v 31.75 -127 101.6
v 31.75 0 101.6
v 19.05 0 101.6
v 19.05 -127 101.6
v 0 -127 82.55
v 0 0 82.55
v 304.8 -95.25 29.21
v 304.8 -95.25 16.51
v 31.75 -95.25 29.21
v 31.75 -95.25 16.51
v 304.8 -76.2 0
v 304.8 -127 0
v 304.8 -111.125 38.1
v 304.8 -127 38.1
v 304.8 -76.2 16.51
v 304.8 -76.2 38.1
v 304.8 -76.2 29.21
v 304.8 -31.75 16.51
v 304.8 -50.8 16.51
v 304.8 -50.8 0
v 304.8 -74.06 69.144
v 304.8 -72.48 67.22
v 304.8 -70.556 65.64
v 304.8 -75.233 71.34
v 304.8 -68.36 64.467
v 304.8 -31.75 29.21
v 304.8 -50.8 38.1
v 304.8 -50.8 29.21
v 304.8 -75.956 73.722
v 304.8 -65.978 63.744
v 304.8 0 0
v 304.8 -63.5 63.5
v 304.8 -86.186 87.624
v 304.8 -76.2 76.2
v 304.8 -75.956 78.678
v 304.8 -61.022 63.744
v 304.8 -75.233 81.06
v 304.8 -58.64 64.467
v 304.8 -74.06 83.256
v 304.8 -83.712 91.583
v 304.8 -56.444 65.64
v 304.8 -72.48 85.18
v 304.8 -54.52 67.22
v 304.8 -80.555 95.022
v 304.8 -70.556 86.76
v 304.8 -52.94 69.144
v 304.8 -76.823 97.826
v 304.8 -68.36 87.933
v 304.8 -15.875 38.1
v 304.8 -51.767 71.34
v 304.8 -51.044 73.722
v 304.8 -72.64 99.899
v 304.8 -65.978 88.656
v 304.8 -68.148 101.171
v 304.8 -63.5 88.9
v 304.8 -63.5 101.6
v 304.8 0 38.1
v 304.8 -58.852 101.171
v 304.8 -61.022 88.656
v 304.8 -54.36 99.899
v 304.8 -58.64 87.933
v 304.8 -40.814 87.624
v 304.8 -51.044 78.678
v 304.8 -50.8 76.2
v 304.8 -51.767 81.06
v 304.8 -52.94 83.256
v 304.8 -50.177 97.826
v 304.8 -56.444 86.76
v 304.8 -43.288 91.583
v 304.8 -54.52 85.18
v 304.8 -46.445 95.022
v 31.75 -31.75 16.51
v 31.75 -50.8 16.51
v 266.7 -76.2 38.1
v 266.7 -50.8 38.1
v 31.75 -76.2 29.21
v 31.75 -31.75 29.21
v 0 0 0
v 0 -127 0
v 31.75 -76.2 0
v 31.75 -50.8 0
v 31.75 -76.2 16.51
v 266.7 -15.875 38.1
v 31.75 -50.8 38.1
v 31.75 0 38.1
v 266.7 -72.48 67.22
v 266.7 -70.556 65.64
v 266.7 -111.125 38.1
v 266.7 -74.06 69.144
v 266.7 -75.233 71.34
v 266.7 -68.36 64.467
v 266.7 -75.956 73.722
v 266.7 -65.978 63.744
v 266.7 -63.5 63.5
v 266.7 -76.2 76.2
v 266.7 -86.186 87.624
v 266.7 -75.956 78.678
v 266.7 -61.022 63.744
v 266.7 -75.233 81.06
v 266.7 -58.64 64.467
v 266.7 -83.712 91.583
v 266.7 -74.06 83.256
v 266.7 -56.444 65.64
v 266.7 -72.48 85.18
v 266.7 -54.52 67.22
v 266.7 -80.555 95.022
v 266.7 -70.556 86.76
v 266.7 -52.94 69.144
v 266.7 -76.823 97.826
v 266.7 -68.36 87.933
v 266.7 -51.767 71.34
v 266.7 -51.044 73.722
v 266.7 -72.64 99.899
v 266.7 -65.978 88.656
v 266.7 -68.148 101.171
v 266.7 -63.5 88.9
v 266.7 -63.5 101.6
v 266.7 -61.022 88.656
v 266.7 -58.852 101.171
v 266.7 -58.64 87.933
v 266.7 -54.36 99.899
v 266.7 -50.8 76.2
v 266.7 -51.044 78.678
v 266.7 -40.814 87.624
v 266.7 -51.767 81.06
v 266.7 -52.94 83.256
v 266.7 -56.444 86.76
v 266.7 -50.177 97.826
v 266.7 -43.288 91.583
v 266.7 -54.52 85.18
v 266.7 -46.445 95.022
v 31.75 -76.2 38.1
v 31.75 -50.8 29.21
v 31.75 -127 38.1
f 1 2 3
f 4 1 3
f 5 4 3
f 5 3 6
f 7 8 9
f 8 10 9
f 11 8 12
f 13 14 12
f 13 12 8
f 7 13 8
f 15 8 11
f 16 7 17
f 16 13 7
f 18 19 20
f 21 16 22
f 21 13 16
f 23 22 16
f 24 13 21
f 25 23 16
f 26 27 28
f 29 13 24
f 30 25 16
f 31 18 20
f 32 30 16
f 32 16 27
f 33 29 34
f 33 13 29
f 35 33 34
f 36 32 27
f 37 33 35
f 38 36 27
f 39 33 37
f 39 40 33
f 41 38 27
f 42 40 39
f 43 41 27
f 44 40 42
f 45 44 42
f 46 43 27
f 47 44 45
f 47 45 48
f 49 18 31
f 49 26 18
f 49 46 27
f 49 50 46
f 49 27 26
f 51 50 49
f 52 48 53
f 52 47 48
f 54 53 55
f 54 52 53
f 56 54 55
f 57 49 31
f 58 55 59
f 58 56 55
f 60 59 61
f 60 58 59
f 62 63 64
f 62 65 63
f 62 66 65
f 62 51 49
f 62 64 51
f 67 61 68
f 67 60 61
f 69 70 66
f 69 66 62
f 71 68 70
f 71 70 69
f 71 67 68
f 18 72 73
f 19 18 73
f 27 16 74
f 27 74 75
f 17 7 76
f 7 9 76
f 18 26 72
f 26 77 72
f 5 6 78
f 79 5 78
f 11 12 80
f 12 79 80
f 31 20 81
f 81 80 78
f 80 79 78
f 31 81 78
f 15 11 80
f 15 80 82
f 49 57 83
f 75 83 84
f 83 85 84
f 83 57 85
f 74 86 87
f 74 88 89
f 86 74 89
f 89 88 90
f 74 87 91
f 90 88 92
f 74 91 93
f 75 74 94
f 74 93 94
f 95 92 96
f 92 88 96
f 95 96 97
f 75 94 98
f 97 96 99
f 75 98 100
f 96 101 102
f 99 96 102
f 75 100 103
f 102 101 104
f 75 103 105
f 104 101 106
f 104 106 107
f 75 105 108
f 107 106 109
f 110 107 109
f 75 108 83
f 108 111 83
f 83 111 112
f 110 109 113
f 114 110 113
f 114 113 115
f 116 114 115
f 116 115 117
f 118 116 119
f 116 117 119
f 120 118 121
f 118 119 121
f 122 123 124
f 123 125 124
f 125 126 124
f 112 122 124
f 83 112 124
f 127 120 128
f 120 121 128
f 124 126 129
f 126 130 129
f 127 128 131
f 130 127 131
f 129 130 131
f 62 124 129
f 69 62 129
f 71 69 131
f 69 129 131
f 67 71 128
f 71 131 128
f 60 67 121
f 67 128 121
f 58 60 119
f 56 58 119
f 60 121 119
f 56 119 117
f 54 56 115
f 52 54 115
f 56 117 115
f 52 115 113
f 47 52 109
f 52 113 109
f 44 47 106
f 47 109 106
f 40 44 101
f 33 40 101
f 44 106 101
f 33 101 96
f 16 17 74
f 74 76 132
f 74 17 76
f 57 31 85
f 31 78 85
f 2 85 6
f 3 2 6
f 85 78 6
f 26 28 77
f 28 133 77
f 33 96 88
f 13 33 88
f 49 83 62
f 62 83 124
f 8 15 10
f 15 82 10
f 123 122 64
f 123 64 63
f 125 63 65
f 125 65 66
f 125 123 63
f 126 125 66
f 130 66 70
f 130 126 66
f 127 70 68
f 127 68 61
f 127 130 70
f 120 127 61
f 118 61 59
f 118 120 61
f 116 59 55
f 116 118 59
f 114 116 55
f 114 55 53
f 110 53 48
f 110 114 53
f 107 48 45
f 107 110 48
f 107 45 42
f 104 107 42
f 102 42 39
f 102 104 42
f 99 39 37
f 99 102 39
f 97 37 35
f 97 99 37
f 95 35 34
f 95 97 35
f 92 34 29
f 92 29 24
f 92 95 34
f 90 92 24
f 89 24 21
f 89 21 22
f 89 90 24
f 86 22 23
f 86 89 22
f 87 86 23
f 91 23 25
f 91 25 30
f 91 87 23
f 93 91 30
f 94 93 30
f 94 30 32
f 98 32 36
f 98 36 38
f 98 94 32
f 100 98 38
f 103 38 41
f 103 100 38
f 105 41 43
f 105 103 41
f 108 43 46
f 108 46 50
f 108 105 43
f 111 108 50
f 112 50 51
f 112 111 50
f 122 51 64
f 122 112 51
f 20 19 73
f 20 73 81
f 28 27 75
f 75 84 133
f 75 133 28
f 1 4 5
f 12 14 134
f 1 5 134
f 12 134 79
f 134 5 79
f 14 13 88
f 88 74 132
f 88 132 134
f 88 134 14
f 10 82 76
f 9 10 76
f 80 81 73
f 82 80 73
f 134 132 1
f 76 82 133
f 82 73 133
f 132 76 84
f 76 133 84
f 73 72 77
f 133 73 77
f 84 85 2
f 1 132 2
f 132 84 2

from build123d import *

# Parameters (mm, degrees)
F1_DEPTH = 127
F3_DEPTH = 234.95
F4_R     = 12.7
F5_DEPTH = 38.1


with BuildPart() as f1:
    # F0 (on Front) → F1 (new body)
    with BuildSketch(Plane.XZ):
        Polygon((0, 82.55), (0, 0), (31.75, 0), (31.75, 101.6), (19.05, 101.6), align=None)
    extrude(amount=F1_DEPTH)

    # F2 (on face) → F3 (join)
    with BuildSketch(Plane.YZ.offset(31.75)):
        Polygon((-127, 38.1), (-127, 0), (-76.2, 0), (-76.2, 16.51), (-95.25, 16.51), (-95.25, 29.21), (-76.2, 29.21), (-76.2, 38.1), align=None)
        Polygon((-50.8, 16.51), (-50.8, 0), (0, 0), (0, 38.1), (-50.8, 38.1), (-50.8, 29.21), (-31.75, 29.21), (-31.75, 16.51), align=None)
    extrude(amount=F3_DEPTH)

    # F4 (on face) → F5 (join)
    with BuildSketch(Plane.YZ.offset(266.7)):
        with BuildLine():
            Line((-127, 38.1), (-127, 0))
            Line((-127, 0), (-76.2, 0))
            Line((-76.2, 0), (-76.2, 16.51))
            Line((-76.2, 16.51), (-95.25, 16.51))
            Line((-95.25, 16.51), (-95.25, 29.21))
            Line((-95.25, 29.21), (-76.2, 29.21))
            Line((-76.2, 29.21), (-76.2, 38.1))
            Line((-76.2, 38.1), (-50.8, 38.1))
            Line((-50.8, 38.1), (-50.8, 29.21))
            Line((-50.8, 29.21), (-31.75, 29.21))
            Line((-31.75, 29.21), (-31.75, 16.51))
            Line((-31.75, 16.51), (-50.8, 16.51))
            Line((-50.8, 16.51), (-50.8, 0))
            Line((-50.8, 0), (0, 0))
            Line((0, 0), (0, 38.1))
            Line((0, 38.1), (-15.875, 38.1))
            Line((-15.875, 38.1), (-40.814084, 87.624062))
            ThreePointArc((-40.814084, 87.624062), (-63.5, 101.6), (-86.185916, 87.624062))
            Line((-86.185916, 87.624062), (-111.125, 38.1))
            Line((-111.125, 38.1), (-127, 38.1))
        make_face()
        with Locations((-63.5, 76.2)):
            Circle(F4_R, mode=Mode.SUBTRACT)
    extrude(amount=F5_DEPTH)


solid = f1.part
